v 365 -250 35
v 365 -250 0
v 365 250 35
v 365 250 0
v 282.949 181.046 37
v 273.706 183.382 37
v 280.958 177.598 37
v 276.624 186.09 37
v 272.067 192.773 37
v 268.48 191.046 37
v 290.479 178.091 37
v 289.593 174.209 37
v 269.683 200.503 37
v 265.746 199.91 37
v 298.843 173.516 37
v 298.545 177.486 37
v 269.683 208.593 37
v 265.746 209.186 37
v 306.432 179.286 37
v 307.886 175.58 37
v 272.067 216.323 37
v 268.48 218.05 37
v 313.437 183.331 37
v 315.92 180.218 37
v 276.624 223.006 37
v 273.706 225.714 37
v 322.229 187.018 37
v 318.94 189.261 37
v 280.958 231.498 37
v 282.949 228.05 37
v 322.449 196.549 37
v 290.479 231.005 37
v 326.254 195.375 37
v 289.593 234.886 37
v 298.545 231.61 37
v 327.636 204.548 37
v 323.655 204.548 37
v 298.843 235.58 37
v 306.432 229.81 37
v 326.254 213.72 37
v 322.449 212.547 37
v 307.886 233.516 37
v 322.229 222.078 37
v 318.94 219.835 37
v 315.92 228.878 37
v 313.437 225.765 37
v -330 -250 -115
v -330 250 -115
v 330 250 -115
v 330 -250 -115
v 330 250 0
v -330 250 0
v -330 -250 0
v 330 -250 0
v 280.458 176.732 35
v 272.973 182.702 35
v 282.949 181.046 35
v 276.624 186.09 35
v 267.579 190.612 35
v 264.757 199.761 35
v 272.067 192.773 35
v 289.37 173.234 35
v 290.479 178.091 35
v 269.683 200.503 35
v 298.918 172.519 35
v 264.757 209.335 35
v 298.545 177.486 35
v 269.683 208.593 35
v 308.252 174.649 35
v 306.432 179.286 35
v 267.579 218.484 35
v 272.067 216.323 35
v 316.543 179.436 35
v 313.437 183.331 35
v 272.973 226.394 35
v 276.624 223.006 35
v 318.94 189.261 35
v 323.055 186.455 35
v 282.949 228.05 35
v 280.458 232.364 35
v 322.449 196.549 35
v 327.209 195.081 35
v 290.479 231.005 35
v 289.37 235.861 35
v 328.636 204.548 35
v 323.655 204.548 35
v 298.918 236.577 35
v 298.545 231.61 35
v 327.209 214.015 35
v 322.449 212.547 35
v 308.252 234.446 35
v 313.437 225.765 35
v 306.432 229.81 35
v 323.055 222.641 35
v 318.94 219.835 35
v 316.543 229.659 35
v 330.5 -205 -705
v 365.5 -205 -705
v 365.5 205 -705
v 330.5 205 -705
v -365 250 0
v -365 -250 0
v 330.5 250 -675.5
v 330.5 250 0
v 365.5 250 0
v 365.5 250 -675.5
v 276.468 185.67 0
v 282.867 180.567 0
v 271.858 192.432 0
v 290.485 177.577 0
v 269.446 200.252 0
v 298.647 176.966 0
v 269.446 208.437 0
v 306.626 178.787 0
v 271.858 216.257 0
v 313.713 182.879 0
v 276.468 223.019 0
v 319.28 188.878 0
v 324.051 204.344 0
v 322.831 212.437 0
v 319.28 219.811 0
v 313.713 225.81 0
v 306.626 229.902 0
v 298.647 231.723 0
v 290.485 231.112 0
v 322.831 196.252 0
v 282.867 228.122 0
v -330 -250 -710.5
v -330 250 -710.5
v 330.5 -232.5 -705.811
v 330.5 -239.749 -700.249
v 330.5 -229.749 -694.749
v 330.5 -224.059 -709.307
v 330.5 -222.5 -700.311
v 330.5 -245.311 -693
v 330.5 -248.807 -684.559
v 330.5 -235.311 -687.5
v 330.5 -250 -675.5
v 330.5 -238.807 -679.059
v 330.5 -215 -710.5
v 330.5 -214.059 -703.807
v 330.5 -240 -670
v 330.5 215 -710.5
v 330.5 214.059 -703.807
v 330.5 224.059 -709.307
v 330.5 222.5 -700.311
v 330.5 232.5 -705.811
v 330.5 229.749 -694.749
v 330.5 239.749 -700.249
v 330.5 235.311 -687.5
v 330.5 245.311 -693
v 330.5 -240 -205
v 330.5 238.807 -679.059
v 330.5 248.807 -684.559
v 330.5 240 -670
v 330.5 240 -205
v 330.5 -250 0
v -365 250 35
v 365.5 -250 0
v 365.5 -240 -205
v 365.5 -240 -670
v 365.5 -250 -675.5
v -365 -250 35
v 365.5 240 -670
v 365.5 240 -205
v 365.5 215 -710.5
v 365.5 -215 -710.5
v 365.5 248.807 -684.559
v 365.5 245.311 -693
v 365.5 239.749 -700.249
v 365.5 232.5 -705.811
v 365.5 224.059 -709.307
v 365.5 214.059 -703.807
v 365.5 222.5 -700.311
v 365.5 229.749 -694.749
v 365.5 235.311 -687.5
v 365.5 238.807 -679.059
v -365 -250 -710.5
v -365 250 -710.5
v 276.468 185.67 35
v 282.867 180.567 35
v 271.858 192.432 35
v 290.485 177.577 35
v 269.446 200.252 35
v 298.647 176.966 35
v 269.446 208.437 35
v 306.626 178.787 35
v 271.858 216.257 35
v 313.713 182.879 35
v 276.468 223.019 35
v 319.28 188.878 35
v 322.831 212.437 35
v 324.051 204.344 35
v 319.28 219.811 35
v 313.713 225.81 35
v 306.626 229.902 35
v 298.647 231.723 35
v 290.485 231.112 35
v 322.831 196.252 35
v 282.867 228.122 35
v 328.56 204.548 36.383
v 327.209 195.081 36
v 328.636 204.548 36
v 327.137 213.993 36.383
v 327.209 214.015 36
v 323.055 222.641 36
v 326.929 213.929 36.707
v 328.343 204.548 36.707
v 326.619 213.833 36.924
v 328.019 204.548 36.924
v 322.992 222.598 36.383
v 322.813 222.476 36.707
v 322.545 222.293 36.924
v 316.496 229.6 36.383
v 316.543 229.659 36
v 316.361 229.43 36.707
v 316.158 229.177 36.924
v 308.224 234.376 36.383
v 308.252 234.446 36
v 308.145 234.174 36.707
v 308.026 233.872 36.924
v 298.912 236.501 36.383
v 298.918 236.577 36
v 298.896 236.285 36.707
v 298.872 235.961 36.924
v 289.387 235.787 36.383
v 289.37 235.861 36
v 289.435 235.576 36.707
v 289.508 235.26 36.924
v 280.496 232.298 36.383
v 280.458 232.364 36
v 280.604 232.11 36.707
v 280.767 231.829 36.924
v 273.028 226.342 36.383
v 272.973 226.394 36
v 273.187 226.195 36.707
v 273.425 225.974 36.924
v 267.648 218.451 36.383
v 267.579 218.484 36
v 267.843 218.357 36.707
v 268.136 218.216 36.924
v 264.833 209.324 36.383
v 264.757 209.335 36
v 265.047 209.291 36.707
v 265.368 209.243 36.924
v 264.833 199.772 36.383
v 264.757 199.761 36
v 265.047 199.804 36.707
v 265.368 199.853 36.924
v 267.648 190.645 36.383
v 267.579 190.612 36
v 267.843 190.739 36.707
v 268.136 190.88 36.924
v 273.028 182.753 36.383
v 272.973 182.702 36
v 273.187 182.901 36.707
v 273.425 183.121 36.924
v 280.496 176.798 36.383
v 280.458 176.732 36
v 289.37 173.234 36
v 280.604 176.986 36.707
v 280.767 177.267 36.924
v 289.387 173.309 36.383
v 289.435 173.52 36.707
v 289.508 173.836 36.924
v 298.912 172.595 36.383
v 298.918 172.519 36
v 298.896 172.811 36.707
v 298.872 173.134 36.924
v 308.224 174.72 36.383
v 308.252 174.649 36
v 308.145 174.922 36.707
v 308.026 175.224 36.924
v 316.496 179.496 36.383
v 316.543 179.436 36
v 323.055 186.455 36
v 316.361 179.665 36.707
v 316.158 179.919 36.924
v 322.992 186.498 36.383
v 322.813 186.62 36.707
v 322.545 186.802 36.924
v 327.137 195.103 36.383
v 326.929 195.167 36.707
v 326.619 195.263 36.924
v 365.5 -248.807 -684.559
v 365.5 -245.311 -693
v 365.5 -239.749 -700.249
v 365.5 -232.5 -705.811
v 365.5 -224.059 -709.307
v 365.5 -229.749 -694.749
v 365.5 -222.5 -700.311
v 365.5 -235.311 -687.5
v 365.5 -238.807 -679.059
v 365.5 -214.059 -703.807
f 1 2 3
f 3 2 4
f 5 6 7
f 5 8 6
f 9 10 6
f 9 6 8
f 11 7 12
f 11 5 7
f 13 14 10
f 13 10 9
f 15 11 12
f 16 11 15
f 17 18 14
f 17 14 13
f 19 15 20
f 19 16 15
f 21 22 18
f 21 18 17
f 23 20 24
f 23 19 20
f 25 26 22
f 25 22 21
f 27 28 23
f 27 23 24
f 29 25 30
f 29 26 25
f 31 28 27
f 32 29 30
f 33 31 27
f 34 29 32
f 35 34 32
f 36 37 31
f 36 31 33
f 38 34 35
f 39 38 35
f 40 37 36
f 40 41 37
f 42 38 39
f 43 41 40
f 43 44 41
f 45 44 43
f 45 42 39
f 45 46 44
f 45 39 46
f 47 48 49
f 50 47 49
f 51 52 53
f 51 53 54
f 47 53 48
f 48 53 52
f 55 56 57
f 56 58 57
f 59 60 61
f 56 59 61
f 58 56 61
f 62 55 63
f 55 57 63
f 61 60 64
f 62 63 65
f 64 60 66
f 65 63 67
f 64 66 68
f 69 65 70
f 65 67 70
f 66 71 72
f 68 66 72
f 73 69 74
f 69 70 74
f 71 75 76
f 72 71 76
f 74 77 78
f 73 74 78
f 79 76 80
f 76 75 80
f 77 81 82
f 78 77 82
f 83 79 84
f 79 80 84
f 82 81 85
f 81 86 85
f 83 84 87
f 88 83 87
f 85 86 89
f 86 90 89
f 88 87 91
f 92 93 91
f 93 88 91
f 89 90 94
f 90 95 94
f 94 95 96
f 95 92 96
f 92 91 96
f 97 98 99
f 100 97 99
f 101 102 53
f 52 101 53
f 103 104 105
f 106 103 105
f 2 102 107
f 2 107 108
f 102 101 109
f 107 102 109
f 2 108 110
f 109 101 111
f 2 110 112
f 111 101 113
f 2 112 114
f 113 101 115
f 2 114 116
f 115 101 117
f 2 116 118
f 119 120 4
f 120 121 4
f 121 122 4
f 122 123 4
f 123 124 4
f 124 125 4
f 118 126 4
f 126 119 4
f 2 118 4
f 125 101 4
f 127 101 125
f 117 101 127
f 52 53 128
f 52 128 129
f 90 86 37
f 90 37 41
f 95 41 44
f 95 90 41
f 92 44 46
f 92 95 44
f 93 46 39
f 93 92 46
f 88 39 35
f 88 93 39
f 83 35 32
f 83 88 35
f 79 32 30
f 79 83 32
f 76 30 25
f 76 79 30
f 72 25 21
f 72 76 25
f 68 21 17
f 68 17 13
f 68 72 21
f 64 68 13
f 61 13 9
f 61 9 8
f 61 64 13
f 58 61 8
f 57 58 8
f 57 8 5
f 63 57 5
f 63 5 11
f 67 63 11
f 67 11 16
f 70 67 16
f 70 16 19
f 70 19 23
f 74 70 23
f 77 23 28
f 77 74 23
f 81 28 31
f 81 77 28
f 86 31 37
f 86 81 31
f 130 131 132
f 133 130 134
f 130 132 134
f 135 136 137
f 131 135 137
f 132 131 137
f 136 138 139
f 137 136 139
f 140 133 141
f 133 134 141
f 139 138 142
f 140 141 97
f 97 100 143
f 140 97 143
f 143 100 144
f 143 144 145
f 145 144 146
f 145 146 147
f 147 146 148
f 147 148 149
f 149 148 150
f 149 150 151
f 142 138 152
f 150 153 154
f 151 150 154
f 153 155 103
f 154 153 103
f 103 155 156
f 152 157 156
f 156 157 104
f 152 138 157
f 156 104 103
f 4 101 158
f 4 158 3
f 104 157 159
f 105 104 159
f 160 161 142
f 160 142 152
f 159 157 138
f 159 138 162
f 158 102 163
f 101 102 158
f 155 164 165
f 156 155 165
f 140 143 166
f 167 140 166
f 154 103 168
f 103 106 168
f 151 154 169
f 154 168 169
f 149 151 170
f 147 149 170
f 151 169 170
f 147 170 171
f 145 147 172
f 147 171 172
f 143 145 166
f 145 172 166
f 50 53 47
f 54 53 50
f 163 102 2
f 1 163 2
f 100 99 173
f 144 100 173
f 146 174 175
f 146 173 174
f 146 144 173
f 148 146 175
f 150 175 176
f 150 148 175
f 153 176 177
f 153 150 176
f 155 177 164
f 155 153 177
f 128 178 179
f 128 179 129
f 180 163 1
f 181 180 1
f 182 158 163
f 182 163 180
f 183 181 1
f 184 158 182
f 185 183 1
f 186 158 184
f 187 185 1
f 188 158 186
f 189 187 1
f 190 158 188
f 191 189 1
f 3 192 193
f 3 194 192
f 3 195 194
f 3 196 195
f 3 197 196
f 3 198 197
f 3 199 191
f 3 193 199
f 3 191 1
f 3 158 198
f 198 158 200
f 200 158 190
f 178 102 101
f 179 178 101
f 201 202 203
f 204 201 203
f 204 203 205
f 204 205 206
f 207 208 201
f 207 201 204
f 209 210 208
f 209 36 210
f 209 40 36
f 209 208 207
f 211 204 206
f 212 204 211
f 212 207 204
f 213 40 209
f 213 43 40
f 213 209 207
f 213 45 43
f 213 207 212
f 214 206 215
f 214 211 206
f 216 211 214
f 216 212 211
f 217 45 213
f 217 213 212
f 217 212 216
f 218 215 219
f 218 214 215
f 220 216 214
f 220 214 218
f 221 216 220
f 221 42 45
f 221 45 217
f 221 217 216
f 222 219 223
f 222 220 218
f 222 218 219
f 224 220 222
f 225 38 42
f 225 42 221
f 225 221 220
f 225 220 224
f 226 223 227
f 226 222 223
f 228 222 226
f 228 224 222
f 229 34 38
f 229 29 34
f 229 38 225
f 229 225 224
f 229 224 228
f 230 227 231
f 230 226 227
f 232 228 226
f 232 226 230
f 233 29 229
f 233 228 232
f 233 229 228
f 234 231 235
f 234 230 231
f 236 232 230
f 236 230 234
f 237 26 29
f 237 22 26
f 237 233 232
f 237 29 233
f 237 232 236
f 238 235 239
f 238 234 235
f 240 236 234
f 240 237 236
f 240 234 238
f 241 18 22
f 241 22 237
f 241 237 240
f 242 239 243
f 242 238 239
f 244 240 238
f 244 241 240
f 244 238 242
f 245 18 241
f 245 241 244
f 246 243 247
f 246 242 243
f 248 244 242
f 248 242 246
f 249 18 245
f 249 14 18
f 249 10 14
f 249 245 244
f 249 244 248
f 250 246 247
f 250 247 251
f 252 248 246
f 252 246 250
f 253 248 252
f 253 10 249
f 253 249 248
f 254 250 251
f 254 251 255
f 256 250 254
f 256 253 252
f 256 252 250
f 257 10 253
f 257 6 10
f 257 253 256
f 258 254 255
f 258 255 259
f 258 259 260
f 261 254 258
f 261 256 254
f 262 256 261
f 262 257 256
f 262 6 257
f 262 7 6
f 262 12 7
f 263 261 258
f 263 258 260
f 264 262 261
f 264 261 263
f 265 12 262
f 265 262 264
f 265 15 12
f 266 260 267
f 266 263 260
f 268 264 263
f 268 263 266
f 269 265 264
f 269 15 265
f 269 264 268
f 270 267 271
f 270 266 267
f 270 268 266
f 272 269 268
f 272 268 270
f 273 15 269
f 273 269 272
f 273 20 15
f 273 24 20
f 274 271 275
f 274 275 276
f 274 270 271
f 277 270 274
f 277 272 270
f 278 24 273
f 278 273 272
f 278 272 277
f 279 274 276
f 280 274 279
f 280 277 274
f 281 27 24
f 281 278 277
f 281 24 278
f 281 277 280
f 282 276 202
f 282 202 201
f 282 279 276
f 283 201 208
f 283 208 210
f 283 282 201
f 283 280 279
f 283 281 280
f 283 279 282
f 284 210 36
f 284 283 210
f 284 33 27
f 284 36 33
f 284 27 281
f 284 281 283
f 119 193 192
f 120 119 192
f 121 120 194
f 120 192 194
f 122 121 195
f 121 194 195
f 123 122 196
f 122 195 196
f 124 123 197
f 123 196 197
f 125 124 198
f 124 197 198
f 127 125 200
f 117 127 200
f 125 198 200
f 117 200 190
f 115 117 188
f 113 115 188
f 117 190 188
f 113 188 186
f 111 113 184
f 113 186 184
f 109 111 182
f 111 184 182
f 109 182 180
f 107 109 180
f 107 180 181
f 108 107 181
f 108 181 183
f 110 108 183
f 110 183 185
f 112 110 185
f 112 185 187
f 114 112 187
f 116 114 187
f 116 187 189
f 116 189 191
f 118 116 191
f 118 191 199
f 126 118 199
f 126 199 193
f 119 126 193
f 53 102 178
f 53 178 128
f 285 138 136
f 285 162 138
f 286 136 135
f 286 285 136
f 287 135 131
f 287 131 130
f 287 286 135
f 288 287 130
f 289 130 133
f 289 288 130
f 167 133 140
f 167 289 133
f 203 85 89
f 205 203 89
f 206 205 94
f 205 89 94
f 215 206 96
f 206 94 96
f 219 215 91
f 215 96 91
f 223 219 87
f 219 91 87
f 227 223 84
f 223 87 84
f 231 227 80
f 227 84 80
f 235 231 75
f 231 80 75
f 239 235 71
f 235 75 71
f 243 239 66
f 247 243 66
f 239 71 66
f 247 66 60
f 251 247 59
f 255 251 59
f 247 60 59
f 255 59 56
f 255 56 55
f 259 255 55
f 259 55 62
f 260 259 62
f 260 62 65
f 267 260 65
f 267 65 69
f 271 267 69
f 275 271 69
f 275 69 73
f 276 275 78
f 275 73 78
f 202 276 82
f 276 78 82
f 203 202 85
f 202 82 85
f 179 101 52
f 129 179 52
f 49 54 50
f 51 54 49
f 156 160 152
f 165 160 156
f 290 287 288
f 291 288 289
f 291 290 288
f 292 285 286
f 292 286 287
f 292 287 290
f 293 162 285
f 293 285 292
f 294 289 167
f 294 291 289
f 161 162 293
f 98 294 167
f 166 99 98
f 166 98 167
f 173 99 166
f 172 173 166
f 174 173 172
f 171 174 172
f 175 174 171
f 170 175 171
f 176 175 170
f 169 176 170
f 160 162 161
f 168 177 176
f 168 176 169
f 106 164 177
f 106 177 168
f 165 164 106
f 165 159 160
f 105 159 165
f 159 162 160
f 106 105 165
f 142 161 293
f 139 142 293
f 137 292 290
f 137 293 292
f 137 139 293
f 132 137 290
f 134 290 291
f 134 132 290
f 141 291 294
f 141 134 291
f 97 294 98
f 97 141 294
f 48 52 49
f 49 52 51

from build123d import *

# Parameters (mm, degrees)
SKETCH002_W      = 480
SKETCH002_H      = 500
EXTRUDE002_DEPTH = 50
FILLET001_R      = 35
SKETCH001_W      = 35
SKETCH001_H      = 500
EXTRUDE001_DEPTH = 710.5
FILLET_R         = 35
SKETCH003_W      = 660
SKETCH003_H      = 500
EXTRUDE003_DEPTH = 115
SKETCH004_R      = 27.455715
EXTRUDE004_DEPTH = 50
SKETCH_W         = 730
SKETCH_H         = 500
EXTRUDE_DEPTH    = 35
SKETCH005_R      = 32.118823
SKETCH005_R_2    = 27.137726
EXTRUDE005_DEPTH = 2
FILLET002_R      = 1


with BuildPart() as fillet001:
    # Sketch002 (on Fillet) → Extrude002 (new body)
    with BuildSketch(Plane.YZ.offset(608)):
        with Locations((0, -455)):
            Rectangle(SKETCH002_W, SKETCH002_H)
    extrude(amount=-EXTRUDE002_DEPTH)


with BuildPart() as fillet001_1:
    # Extrude002 placement: moved
    add(fillet001.part.moved(Location((-234, 0, 0))))

    # Fillet001
    fillet001_edges = [fillet001_1.edges().sort_by_distance(p)[0] for p in [
        (349, -240, -705),
        (349, 240, -705),
    ]]
    fillet(fillet001_edges, radius=FILLET001_R)


with BuildPart() as cut:
    # Sketch001 (on Sketch) → Extrude001 (new body)
    with BuildSketch(Plane.XY):
        with Locations((-347.5, 0)):
            Rectangle(SKETCH001_W, SKETCH001_H)
        with Locations((348, 0)):
            Rectangle(SKETCH001_W, SKETCH001_H)
    extrude(amount=-EXTRUDE001_DEPTH)

    # Fillet
    fillet_edges = [cut.edges().sort_by_distance(p)[0] for p in [
        (348, 250, -710.5),
        (348, -250, -710.5),
    ]]
    fillet(fillet_edges, radius=FILLET_R)

    # Cut: cut Fillet001
    add(fillet001_1.part, mode=Mode.SUBTRACT)


with BuildPart() as extrude003:
    # Sketch003 (on Extrude) → Extrude003 (new body)
    with BuildSketch(Plane.XY):
        Rectangle(SKETCH003_W, SKETCH003_H)
    extrude(amount=-EXTRUDE003_DEPTH)


with BuildPart() as extrude004:
    # Sketch004 (on Face6 of Extrude) → Extrude004 (new body)
    with BuildSketch(Plane.XY.offset(35)):
        with Locations((296.594958, 204.344476)):
            Circle(SKETCH004_R)
    extrude(amount=-EXTRUDE004_DEPTH)


with BuildPart() as cut001:
    # Sketch → Extrude (new body)
    with BuildSketch(Plane.XY):
        Rectangle(SKETCH_W, SKETCH_H)
    extrude(amount=EXTRUDE_DEPTH)

    # Cut001: cut Extrude004
    add(extrude004.part, mode=Mode.SUBTRACT)


with BuildPart() as fillet002:
    # Sketch005 (on Face5 of Cut001) → Extrude005 (new body)
    with BuildSketch(Plane.XY.offset(35)):
        with Locations((296.517395, 204.547883)):
            Circle(SKETCH005_R)
        with Locations((296.517395, 204.547883)):
            Circle(SKETCH005_R_2, mode=Mode.SUBTRACT)
    extrude(amount=EXTRUDE005_DEPTH)

    # Fillet002
    fillet002_edges = [fillet002.edges().sort_by_distance(p)[0] for p in [
        (264.398572, 204.547883, 37),
    ]]
    fillet(fillet002_edges, radius=FILLET002_R)


solid = Compound([cut.part, extrude003.part, cut001.part, fillet002.part])
